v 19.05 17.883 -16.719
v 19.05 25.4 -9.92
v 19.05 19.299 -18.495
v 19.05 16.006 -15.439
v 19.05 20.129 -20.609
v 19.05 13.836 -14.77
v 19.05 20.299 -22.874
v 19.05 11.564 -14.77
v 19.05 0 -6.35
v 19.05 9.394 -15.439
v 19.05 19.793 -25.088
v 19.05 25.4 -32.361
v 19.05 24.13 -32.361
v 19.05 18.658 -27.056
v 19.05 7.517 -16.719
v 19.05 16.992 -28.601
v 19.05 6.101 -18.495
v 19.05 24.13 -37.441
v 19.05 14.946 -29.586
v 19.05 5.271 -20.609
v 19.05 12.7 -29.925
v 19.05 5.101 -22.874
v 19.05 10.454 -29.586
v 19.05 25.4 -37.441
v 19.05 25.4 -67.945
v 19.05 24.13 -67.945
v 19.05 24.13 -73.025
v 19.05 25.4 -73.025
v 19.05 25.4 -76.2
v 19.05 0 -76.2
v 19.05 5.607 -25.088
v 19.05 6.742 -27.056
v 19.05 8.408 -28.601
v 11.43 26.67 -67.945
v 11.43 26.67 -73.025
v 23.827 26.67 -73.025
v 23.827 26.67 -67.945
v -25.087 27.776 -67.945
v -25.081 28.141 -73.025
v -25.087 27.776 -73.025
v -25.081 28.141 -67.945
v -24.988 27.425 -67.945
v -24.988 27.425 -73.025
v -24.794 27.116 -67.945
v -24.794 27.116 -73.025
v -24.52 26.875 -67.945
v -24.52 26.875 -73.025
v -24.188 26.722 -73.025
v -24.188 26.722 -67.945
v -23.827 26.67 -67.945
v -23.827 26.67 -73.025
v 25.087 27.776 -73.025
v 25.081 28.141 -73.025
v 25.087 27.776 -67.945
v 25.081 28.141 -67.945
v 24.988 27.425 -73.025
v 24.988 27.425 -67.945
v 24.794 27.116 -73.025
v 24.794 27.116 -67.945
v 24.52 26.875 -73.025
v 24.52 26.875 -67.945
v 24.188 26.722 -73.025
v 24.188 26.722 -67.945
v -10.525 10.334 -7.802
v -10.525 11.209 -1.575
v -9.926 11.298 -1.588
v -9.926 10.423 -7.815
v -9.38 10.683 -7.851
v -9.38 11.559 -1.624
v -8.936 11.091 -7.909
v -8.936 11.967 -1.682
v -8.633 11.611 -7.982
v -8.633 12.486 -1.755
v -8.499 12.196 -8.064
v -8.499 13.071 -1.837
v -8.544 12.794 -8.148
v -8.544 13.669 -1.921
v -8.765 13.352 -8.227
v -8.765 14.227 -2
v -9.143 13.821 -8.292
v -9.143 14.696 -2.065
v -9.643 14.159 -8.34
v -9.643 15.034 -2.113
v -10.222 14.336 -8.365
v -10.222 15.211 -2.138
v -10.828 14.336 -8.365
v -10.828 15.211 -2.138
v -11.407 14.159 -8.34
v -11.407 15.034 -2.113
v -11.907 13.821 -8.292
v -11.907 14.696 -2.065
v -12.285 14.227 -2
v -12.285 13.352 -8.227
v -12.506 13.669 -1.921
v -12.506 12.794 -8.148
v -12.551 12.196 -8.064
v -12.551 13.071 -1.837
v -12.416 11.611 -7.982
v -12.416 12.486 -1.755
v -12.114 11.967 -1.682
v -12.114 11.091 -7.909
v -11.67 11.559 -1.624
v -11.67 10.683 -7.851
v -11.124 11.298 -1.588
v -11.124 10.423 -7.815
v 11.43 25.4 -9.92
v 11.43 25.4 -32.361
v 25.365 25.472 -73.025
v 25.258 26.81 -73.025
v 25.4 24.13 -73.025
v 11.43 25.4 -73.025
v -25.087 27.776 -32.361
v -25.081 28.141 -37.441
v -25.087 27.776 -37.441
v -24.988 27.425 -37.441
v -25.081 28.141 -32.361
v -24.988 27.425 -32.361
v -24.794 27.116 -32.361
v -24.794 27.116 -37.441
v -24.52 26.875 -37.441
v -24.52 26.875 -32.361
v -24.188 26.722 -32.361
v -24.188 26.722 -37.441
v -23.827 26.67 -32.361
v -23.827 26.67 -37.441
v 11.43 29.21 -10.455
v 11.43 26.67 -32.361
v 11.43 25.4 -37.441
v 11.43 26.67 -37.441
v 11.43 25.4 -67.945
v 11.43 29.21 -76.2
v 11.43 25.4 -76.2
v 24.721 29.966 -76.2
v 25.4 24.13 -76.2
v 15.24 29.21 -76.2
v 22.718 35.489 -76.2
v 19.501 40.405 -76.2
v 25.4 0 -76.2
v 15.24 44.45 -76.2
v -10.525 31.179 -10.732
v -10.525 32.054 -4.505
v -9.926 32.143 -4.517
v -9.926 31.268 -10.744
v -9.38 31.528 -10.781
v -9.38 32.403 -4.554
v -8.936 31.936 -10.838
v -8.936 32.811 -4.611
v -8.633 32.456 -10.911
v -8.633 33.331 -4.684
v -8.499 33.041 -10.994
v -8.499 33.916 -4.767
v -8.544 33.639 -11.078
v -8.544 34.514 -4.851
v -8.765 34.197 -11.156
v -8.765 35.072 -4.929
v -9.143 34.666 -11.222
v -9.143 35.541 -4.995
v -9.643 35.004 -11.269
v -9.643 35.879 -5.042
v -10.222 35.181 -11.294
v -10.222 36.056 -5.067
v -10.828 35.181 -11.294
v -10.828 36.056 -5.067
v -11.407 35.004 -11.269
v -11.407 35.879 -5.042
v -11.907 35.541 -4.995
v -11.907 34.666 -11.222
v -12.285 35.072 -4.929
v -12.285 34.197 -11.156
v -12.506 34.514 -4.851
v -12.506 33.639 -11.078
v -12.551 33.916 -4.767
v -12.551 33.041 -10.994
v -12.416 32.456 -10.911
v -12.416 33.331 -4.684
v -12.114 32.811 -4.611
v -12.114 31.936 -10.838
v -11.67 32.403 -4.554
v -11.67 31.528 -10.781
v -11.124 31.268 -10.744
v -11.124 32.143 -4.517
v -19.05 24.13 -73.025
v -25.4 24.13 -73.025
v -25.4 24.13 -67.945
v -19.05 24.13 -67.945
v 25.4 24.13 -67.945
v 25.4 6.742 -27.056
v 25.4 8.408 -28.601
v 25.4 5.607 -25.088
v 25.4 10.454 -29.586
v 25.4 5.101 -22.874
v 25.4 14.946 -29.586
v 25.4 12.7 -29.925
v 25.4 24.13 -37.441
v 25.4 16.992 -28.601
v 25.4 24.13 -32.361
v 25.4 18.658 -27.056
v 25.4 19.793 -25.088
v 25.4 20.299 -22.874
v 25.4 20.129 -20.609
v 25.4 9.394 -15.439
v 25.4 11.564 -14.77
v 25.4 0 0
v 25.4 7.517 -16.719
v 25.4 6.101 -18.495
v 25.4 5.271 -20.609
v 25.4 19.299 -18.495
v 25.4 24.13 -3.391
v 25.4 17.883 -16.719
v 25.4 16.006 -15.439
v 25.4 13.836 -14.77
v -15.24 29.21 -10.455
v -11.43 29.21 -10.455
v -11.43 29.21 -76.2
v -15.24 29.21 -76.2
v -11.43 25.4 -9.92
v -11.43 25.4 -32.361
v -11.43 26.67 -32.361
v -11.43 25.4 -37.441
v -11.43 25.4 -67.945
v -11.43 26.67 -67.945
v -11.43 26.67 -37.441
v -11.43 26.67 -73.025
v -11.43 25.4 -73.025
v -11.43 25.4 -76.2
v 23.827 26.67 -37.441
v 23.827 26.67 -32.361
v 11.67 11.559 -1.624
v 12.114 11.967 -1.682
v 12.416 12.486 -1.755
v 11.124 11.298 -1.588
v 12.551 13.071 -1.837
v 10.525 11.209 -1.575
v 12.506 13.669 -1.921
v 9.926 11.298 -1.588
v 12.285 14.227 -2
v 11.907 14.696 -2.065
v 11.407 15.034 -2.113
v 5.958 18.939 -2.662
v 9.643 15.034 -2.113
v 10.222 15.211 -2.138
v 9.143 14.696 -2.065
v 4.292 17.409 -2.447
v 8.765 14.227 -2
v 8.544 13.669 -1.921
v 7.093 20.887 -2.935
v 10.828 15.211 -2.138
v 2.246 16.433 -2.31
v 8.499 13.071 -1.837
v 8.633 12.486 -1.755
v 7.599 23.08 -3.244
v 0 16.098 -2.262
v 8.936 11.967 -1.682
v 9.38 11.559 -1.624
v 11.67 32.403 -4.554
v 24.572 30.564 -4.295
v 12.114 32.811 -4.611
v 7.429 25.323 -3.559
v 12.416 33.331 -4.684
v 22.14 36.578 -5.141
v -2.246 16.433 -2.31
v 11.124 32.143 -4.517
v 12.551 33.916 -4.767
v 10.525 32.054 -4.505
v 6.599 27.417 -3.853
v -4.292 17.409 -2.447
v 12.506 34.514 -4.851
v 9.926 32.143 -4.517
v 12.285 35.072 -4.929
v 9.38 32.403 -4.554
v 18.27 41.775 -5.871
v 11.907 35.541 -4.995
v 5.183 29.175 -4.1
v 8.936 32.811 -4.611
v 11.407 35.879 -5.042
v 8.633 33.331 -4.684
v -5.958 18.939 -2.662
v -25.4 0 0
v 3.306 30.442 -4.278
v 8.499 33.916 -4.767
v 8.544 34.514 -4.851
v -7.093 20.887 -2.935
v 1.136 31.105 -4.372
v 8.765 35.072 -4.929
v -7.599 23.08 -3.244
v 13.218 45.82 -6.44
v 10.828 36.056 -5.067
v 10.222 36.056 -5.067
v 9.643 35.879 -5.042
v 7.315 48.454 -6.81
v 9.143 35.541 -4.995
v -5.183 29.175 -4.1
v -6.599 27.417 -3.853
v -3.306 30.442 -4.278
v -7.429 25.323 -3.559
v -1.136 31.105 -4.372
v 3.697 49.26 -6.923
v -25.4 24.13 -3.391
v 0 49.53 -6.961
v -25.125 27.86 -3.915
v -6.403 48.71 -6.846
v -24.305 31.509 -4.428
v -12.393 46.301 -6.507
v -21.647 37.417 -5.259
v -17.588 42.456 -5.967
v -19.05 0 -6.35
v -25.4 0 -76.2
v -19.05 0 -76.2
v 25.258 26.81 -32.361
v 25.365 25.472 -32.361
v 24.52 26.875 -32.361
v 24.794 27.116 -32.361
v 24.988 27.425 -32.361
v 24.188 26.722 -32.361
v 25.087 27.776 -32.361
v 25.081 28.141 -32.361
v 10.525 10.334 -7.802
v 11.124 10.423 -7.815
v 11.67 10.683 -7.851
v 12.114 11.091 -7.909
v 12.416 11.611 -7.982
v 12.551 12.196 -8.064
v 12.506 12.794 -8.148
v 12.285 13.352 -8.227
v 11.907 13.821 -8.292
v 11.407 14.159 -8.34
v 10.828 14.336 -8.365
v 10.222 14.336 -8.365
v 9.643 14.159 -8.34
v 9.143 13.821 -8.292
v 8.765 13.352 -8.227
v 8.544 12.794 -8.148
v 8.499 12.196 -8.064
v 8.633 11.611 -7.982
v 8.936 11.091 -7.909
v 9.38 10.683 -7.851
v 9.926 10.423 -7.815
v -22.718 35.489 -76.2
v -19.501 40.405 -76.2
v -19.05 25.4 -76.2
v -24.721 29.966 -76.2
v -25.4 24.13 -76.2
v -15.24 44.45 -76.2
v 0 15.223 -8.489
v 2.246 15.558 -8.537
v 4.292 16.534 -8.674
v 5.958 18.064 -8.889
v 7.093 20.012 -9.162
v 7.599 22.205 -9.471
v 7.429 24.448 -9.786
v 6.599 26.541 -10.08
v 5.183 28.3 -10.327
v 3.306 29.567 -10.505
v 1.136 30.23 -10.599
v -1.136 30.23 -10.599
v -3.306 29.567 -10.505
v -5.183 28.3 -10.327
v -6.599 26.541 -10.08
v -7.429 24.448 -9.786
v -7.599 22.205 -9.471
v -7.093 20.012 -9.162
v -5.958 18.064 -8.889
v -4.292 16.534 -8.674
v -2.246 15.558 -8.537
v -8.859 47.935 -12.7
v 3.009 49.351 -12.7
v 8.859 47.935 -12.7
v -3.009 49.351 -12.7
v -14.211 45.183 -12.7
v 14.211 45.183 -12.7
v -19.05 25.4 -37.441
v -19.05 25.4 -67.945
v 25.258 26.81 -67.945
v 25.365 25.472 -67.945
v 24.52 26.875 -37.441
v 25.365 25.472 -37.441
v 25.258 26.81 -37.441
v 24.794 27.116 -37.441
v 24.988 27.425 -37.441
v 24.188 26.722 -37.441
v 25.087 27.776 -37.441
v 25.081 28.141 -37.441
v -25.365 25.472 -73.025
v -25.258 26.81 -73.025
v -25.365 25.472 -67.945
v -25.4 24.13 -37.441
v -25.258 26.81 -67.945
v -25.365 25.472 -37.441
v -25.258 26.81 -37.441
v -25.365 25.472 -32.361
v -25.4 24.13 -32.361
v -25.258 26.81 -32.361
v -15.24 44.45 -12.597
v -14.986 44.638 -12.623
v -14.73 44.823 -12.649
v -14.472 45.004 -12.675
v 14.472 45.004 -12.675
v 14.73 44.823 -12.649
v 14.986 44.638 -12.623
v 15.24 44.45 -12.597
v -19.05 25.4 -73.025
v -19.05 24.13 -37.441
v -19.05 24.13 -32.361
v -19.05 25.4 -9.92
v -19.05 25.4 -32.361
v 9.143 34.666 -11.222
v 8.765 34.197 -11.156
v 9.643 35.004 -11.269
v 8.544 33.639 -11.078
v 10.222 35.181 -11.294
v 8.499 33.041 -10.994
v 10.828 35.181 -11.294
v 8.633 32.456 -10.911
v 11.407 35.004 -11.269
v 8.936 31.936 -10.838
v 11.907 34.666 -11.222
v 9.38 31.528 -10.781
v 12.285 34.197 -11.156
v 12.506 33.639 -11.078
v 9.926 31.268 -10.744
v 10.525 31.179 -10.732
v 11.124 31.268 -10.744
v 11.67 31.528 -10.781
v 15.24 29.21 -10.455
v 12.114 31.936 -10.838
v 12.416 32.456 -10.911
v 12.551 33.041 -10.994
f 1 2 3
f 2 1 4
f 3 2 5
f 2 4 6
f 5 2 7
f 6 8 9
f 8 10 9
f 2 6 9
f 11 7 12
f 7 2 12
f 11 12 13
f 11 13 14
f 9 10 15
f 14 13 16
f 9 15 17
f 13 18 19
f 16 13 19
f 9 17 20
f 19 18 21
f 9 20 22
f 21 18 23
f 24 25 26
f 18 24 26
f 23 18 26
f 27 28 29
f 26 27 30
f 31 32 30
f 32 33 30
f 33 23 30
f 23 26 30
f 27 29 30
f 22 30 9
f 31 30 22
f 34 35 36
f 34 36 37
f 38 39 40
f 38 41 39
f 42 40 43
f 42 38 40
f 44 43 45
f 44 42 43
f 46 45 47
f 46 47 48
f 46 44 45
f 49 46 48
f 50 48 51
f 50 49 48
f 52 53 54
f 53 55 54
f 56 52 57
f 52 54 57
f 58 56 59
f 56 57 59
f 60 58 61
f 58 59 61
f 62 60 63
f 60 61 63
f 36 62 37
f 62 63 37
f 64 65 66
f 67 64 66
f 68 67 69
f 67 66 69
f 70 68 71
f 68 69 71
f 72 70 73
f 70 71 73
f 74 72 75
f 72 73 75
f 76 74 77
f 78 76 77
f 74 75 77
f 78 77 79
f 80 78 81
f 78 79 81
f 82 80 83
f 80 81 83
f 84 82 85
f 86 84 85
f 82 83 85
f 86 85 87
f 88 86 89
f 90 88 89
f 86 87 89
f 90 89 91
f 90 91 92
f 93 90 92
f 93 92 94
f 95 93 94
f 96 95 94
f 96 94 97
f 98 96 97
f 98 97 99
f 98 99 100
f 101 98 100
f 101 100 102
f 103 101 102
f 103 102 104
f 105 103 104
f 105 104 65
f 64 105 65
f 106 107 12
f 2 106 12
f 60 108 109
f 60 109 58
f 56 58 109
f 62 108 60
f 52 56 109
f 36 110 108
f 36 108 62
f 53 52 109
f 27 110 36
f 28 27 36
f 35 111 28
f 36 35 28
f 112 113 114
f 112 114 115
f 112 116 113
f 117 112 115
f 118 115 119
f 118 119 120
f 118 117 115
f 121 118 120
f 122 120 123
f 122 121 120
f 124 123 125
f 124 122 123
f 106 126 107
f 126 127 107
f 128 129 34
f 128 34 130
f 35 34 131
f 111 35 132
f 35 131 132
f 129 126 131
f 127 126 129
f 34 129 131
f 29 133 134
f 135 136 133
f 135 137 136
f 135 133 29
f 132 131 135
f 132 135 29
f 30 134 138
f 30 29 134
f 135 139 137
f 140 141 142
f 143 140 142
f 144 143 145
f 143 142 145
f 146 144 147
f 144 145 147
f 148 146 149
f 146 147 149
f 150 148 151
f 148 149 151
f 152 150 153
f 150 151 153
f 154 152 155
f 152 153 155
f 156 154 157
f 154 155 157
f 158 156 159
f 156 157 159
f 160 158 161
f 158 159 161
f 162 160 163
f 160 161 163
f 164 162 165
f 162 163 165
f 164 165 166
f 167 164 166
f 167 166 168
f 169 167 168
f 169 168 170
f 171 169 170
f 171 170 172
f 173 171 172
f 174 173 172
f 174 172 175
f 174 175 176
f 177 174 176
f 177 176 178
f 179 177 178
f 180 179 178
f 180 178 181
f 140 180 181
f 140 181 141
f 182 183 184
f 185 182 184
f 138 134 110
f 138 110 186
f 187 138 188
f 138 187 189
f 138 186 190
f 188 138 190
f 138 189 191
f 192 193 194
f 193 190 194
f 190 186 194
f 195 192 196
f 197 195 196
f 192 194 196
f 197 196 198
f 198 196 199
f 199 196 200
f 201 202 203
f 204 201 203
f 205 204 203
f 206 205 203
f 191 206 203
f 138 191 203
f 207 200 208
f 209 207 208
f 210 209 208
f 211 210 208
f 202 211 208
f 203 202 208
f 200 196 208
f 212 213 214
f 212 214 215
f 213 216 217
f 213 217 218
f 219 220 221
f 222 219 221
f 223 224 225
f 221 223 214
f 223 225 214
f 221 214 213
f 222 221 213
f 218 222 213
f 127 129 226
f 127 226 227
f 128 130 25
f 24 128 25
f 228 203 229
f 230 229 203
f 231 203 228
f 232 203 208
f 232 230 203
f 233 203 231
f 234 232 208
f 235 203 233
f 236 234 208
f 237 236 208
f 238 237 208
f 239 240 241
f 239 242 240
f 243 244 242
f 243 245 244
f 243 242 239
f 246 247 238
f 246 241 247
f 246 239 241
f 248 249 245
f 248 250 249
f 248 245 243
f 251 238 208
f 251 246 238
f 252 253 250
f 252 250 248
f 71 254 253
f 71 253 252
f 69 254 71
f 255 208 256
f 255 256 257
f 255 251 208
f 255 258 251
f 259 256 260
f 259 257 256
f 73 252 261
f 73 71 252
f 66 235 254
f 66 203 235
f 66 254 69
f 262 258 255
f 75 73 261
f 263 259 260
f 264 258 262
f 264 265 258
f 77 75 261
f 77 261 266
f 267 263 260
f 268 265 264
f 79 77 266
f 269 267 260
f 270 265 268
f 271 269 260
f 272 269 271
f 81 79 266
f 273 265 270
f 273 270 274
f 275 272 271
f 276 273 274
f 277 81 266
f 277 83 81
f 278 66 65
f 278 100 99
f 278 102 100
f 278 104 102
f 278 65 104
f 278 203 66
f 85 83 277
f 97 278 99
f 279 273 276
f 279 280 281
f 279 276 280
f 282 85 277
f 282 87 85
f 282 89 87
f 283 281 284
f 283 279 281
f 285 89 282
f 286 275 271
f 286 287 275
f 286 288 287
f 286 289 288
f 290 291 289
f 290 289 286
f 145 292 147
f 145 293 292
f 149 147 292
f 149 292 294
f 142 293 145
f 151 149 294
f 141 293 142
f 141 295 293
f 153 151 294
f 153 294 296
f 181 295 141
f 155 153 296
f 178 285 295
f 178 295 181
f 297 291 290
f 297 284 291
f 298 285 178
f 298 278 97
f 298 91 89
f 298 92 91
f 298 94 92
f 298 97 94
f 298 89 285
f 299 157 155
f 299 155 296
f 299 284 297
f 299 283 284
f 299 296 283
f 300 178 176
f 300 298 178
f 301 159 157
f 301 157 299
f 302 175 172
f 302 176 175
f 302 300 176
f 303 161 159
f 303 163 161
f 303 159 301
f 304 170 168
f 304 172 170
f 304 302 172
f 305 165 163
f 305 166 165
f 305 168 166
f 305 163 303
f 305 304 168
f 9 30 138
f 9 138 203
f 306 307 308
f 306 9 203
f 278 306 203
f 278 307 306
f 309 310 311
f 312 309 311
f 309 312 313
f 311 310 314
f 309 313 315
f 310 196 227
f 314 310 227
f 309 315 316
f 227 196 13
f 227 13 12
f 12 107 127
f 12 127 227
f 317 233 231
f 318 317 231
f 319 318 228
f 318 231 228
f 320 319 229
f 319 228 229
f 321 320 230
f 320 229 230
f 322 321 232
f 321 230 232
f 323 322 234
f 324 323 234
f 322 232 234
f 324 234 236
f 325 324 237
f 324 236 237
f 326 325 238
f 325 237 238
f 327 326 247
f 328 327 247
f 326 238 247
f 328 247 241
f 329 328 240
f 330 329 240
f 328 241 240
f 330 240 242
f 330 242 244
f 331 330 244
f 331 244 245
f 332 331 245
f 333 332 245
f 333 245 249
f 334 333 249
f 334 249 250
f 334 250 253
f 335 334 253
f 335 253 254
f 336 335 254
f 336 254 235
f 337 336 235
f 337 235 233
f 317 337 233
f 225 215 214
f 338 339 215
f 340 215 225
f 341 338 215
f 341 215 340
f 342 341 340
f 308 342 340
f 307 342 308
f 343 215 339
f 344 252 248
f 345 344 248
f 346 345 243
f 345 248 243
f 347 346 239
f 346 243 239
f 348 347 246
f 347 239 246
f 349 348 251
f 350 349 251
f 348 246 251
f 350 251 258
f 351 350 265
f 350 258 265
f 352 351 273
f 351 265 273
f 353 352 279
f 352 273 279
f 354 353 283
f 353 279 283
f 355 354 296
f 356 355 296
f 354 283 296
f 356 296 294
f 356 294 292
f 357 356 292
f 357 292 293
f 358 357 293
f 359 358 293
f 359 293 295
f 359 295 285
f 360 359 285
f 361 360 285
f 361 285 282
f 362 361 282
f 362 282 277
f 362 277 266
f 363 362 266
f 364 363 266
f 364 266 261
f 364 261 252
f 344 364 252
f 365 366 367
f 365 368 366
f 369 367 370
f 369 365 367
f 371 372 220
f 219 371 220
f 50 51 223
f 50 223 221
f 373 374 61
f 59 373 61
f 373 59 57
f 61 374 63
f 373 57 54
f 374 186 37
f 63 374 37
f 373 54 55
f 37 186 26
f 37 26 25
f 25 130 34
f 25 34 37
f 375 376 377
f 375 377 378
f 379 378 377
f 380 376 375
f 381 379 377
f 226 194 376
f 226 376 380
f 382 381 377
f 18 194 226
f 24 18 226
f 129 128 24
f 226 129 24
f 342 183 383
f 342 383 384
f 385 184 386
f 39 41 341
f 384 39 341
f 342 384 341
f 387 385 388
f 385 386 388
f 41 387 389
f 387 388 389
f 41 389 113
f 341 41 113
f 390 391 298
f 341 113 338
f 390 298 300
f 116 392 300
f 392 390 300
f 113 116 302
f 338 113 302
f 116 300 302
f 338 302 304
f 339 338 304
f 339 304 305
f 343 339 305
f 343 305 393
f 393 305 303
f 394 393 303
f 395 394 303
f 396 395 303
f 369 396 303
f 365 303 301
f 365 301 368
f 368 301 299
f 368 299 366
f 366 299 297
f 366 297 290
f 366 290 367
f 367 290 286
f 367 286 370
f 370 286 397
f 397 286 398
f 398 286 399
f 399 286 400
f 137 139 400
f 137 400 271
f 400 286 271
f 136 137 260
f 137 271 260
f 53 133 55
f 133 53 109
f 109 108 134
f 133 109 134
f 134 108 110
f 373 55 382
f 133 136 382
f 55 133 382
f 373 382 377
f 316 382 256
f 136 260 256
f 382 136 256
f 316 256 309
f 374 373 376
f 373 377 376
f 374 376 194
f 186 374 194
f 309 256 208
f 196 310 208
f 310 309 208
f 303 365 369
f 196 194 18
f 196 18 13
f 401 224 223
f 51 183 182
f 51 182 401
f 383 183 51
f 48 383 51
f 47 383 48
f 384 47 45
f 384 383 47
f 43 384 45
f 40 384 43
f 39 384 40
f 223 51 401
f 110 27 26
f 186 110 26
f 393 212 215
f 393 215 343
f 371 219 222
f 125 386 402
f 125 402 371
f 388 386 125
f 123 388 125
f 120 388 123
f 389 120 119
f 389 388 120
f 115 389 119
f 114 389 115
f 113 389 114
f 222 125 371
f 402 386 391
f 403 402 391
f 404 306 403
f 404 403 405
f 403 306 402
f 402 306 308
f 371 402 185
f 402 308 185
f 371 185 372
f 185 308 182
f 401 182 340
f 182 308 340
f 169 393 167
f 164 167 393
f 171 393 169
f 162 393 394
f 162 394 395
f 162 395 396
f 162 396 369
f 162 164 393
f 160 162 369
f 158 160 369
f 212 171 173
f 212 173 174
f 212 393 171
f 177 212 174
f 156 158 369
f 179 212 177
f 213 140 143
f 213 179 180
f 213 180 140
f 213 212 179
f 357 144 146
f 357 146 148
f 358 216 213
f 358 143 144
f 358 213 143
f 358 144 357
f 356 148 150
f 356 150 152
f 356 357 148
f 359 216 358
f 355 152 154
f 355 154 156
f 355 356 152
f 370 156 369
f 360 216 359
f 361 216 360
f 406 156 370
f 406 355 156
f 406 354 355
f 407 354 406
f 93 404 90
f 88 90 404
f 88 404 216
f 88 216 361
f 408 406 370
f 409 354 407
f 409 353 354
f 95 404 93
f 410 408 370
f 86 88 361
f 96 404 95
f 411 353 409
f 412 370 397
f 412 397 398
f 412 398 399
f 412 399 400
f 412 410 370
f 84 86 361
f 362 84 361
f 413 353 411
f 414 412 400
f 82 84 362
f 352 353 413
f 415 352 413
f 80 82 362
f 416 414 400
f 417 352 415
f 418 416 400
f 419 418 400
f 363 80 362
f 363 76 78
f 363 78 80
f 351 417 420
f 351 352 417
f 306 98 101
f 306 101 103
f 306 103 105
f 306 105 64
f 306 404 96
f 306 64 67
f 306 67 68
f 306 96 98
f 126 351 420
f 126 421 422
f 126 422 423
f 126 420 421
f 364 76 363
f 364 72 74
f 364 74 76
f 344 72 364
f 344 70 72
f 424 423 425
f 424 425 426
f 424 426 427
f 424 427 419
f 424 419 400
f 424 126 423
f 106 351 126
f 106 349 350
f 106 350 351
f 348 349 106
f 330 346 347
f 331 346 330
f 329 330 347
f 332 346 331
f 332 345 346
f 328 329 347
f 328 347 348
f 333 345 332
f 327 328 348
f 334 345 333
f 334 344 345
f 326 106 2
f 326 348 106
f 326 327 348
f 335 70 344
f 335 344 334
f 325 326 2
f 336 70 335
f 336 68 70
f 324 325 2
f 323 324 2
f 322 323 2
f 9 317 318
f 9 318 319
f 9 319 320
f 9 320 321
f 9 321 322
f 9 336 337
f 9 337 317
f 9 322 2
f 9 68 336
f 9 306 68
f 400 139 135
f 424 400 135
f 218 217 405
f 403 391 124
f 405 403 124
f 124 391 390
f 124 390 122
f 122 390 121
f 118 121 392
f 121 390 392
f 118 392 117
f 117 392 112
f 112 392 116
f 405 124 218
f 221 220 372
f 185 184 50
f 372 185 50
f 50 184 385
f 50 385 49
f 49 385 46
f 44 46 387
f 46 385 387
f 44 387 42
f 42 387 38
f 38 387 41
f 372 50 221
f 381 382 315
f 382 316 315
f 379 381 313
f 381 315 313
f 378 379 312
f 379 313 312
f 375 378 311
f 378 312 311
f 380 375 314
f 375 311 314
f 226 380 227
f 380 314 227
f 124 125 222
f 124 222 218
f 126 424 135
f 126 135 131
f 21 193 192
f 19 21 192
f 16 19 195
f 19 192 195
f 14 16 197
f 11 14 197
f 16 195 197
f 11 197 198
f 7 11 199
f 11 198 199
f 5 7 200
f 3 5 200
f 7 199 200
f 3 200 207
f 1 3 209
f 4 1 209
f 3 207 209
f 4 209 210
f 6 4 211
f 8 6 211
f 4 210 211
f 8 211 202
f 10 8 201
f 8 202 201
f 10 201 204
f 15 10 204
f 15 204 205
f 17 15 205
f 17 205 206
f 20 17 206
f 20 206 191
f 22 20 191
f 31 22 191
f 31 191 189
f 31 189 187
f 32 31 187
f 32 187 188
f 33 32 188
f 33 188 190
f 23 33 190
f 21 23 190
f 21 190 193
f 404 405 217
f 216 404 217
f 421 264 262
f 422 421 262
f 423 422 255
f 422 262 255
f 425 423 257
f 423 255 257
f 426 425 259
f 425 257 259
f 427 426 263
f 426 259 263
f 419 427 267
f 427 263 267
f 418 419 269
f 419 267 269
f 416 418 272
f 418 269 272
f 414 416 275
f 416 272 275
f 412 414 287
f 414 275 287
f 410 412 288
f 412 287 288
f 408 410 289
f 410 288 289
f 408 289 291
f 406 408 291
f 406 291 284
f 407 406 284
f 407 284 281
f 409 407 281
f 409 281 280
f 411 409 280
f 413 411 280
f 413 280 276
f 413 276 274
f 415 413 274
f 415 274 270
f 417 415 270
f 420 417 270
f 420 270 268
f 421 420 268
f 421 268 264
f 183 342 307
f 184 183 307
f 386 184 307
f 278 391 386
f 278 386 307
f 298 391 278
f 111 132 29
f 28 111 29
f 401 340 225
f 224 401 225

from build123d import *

# Parameters (mm, degrees)
BOSS_EXTRUDE1_DEPTH      = 25.4
BOSS_EXTRUDE1_DEPTH_BACK = 25.4
SKETCH3_R                = 8.382
CUT_EXTRUDE9_DEPTH       = 95.36535858
CUT_EXTRUDE14_DEPTH      = 63.5
SKETCH14_W               = 38.1
SKETCH14_H               = 46.622003784
CUT_EXTRUDE23_DEPTH      = 12.7
CUT_EXTRUDE23_DRAFT      = -8
SKETCH13_W               = 5.08
SKETCH13_H               = 2.54
CUT_EXTRUDE22_DEPTH      = 105.116765701
FILLET4_R                = 25.4
CUT_EXTRUDE24_REACH      = 96.365
SKETCH17_R               = 7.62
SKETCH17_R_2             = 2.032
CUT_EXTRUDE25_DEPTH      = 95.36535858
FILLET5_R                = 1.27
SKETCH17_7_R             = 2.032
CUT_EXTRUDE26_DEPTH      = 12.7
SKETCH18_R               = 7.62
CUT_EXTRUDE27_DEPTH      = 12.7


with BuildPart() as part:
    # Sketch1 → Boss-Extrude1 (new, two sides: drawn at the far end of the back side and taken through both)
    with BuildSketch(Plane(origin=(0, 0, 0), x_dir=(0, 0, -1), z_dir=(1, 0, 0)).offset(-BOSS_EXTRUDE1_DEPTH_BACK)):
        Polygon((0, 0), (6.960987543, 49.53), (76.2, 49.53), (76.2, 0), align=None)
    extrude(amount=BOSS_EXTRUDE1_DEPTH + BOSS_EXTRUDE1_DEPTH_BACK)

    # Sketch3 → Cut-Extrude9 (cut, through all)
    with BuildSketch(Plane.XZ):
        with Locations(Location((0, -63.246, 0), (0, 0, 270))):
            Circle(SKETCH3_R)
        with Locations(Location((0, -25.4, 0), (0, 0, 270))):
            Circle(SKETCH3_R)
    extrude(amount=-CUT_EXTRUDE9_DEPTH, mode=Mode.SUBTRACT)

    # Sketch9 → Cut-Extrude14 (cut)
    with BuildSketch(Plane(origin=(0, 0, -76.2), x_dir=(-1, 0, 0), z_dir=(0, 0, -1))):
        Polygon((-15.24, 49.53), (-15.24, 29.21), (-11.43, 29.21), (-11.43, 25.4), (-19.05, 25.4), (-19.05, 0), (19.05, 0), (19.05, 25.4), (11.43, 25.4), (11.43, 29.21), (15.24, 29.21), (15.24, 49.53), align=None)
    extrude(amount=-CUT_EXTRUDE14_DEPTH, mode=Mode.SUBTRACT)


with BuildPart() as cut_extrude23_tool:
    # Sketch14 → Cut-Extrude23 (with draft: the straight prism first)
    with BuildSketch(Plane.XZ):
        with Locations((0, -29.661001892)):
            Rectangle(SKETCH14_W, SKETCH14_H)
    extrude(amount=-CUT_EXTRUDE23_DEPTH)
    # Cut-Extrude23: the draft: its side faces are tilted about the plane it starts from
    cut_extrude23_sides = [cut_extrude23_tool.faces().sort_by_distance(p)[0] for p in [
        (0, 6.35, -6.35),
        (-19.05, 6.35, -29.661001892),
        (0, 6.35, -52.972003784),
        (19.05, 6.35, -29.661001892),
    ]]
    draft(cut_extrude23_sides, Plane.XZ, CUT_EXTRUDE23_DRAFT)


with BuildPart() as part_1:
    add(part.part)

    # Cut-Extrude23: cut by cut_extrude23_tool
    add(cut_extrude23_tool.part, mode=Mode.SUBTRACT)

    # Sketch13 → Cut-Extrude22 (cut, through all)
    with BuildSketch(Plane.ZY.offset(25.4)):
        with Locations((-70.485, 25.4)):
            Rectangle(SKETCH13_W, SKETCH13_H)
        with Locations((-34.900987543, 25.4)):
            Rectangle(SKETCH13_W, SKETCH13_H)
    extrude(amount=-CUT_EXTRUDE22_DEPTH, mode=Mode.SUBTRACT)

    # Fillet4
    # the kernel refuses this fillet: 25.4 mm, written as the material it takes off along each edge
    with BuildSketch(Plane(origin=(-25.4, 49.53, 56.539012457), x_dir=(1, 0, 0), z_dir=(0, 0, -1)), Plane(origin=(25.4, 49.53, 56.539012457), x_dir=(0, -1, 0), z_dir=(0, 0, -1))) as fillet4_piece_1:
        with BuildLine():
            CenterArc((FILLET4_R, FILLET4_R), FILLET4_R, 180, 90)
            Line((0, FILLET4_R), (0, 0))
            Line((0, 0), (FILLET4_R, 0))
        make_face()
    extrude(amount=196.239012457, mode=Mode.SUBTRACT)

    # Cut-Extrude24: up to this face of the body (flat: up to its plane)
    cut_extrude24_end = Plane(part_1.part.faces().sort_by_distance((0, 6.245967005, -7.227813416))[0])
    # Sketch9<4> → Cut-Extrude24 (cut, up to the picked face)
    with BuildSketch(Plane(origin=(0, 0, -76.2), x_dir=(-1, 0, 0), z_dir=(0, 0, -1)), mode=Mode.PRIVATE) as cut_extrude24_sk1:
        Polygon((-15.24, 49.53), (-15.24, 29.21), (-11.43, 29.21), (-11.43, 25.4), (-19.05, 25.4), (-19.05, 0), (19.05, 0), (19.05, 25.4), (11.43, 25.4), (11.43, 29.21), (15.24, 29.21), (15.24, 49.53), align=None)
    cut_extrude24_tool1 = split(extrude(cut_extrude24_sk1.sketch, amount=-CUT_EXTRUDE24_REACH, mode=Mode.PRIVATE), bisect_by=cut_extrude24_end, keep=Keep.BOTH, mode=Mode.PRIVATE)
    add(cut_extrude24_tool1.solids().sort_by(Axis((0, 23.326156, -76.2), (0, 0, 1)))[0], mode=Mode.SUBTRACT)

    # Sketch17 → Cut-Extrude25 (cut, through all)
    with BuildSketch(Plane(origin=(0, 0, 0), x_dir=(1, 0, 0), z_dir=(0, 0.13917310096006918, 0.9902680687415698))):
        with Locations(Location((0, 23.876, 0), (0, 0, 270))):
            Circle(SKETCH17_R)
        with Locations(Location((10.524860174, 13.351139826, 0), (0, 0, 270))):
            Circle(SKETCH17_R_2)
        with Locations(Location((-10.524860174, 13.351139826, 0), (0, 0, 270))):
            Circle(SKETCH17_R_2)
    extrude(amount=-CUT_EXTRUDE25_DEPTH, mode=Mode.SUBTRACT)

    # Fillet5
    fillet5_edges = [part_1.edges().sort_by_distance(p)[0] for p in [
        (25.272680903, 26.67, -70.485),
        (-25.272680903, 26.67, -70.485),
        (25.272680903, 26.67, -34.900987543),
        (-25.272680903, 26.67, -34.900987543),
    ]]
    fillet(fillet5_edges, radius=FILLET5_R)

    # Sketch17<7> → Cut-Extrude26 (cut)
    with BuildSketch(Plane(origin=(0, 0, 0), x_dir=(1, 0, 0), z_dir=(0, 0.13917310096006918, 0.9902680687415698))):
        with Locations(Location((10.524860174, 34.400860174, 0), (0, 0, 270))):
            Circle(SKETCH17_7_R)
        with Locations(Location((-10.524860174, 34.400860174, 0), (0, 0, 270))):
            Circle(SKETCH17_7_R)
    extrude(amount=-CUT_EXTRUDE26_DEPTH, mode=Mode.SUBTRACT)

    # Sketch18 → Cut-Extrude27 (cut)
    with BuildSketch(Plane(origin=(25.4, 0, 0), x_dir=(0, 0, -1), z_dir=(1, 0, 0))):
        with Locations((22.304564874, 12.7)):
            Circle(SKETCH18_R)
    extrude(amount=-CUT_EXTRUDE27_DEPTH, mode=Mode.SUBTRACT)


solid = part_1.part
